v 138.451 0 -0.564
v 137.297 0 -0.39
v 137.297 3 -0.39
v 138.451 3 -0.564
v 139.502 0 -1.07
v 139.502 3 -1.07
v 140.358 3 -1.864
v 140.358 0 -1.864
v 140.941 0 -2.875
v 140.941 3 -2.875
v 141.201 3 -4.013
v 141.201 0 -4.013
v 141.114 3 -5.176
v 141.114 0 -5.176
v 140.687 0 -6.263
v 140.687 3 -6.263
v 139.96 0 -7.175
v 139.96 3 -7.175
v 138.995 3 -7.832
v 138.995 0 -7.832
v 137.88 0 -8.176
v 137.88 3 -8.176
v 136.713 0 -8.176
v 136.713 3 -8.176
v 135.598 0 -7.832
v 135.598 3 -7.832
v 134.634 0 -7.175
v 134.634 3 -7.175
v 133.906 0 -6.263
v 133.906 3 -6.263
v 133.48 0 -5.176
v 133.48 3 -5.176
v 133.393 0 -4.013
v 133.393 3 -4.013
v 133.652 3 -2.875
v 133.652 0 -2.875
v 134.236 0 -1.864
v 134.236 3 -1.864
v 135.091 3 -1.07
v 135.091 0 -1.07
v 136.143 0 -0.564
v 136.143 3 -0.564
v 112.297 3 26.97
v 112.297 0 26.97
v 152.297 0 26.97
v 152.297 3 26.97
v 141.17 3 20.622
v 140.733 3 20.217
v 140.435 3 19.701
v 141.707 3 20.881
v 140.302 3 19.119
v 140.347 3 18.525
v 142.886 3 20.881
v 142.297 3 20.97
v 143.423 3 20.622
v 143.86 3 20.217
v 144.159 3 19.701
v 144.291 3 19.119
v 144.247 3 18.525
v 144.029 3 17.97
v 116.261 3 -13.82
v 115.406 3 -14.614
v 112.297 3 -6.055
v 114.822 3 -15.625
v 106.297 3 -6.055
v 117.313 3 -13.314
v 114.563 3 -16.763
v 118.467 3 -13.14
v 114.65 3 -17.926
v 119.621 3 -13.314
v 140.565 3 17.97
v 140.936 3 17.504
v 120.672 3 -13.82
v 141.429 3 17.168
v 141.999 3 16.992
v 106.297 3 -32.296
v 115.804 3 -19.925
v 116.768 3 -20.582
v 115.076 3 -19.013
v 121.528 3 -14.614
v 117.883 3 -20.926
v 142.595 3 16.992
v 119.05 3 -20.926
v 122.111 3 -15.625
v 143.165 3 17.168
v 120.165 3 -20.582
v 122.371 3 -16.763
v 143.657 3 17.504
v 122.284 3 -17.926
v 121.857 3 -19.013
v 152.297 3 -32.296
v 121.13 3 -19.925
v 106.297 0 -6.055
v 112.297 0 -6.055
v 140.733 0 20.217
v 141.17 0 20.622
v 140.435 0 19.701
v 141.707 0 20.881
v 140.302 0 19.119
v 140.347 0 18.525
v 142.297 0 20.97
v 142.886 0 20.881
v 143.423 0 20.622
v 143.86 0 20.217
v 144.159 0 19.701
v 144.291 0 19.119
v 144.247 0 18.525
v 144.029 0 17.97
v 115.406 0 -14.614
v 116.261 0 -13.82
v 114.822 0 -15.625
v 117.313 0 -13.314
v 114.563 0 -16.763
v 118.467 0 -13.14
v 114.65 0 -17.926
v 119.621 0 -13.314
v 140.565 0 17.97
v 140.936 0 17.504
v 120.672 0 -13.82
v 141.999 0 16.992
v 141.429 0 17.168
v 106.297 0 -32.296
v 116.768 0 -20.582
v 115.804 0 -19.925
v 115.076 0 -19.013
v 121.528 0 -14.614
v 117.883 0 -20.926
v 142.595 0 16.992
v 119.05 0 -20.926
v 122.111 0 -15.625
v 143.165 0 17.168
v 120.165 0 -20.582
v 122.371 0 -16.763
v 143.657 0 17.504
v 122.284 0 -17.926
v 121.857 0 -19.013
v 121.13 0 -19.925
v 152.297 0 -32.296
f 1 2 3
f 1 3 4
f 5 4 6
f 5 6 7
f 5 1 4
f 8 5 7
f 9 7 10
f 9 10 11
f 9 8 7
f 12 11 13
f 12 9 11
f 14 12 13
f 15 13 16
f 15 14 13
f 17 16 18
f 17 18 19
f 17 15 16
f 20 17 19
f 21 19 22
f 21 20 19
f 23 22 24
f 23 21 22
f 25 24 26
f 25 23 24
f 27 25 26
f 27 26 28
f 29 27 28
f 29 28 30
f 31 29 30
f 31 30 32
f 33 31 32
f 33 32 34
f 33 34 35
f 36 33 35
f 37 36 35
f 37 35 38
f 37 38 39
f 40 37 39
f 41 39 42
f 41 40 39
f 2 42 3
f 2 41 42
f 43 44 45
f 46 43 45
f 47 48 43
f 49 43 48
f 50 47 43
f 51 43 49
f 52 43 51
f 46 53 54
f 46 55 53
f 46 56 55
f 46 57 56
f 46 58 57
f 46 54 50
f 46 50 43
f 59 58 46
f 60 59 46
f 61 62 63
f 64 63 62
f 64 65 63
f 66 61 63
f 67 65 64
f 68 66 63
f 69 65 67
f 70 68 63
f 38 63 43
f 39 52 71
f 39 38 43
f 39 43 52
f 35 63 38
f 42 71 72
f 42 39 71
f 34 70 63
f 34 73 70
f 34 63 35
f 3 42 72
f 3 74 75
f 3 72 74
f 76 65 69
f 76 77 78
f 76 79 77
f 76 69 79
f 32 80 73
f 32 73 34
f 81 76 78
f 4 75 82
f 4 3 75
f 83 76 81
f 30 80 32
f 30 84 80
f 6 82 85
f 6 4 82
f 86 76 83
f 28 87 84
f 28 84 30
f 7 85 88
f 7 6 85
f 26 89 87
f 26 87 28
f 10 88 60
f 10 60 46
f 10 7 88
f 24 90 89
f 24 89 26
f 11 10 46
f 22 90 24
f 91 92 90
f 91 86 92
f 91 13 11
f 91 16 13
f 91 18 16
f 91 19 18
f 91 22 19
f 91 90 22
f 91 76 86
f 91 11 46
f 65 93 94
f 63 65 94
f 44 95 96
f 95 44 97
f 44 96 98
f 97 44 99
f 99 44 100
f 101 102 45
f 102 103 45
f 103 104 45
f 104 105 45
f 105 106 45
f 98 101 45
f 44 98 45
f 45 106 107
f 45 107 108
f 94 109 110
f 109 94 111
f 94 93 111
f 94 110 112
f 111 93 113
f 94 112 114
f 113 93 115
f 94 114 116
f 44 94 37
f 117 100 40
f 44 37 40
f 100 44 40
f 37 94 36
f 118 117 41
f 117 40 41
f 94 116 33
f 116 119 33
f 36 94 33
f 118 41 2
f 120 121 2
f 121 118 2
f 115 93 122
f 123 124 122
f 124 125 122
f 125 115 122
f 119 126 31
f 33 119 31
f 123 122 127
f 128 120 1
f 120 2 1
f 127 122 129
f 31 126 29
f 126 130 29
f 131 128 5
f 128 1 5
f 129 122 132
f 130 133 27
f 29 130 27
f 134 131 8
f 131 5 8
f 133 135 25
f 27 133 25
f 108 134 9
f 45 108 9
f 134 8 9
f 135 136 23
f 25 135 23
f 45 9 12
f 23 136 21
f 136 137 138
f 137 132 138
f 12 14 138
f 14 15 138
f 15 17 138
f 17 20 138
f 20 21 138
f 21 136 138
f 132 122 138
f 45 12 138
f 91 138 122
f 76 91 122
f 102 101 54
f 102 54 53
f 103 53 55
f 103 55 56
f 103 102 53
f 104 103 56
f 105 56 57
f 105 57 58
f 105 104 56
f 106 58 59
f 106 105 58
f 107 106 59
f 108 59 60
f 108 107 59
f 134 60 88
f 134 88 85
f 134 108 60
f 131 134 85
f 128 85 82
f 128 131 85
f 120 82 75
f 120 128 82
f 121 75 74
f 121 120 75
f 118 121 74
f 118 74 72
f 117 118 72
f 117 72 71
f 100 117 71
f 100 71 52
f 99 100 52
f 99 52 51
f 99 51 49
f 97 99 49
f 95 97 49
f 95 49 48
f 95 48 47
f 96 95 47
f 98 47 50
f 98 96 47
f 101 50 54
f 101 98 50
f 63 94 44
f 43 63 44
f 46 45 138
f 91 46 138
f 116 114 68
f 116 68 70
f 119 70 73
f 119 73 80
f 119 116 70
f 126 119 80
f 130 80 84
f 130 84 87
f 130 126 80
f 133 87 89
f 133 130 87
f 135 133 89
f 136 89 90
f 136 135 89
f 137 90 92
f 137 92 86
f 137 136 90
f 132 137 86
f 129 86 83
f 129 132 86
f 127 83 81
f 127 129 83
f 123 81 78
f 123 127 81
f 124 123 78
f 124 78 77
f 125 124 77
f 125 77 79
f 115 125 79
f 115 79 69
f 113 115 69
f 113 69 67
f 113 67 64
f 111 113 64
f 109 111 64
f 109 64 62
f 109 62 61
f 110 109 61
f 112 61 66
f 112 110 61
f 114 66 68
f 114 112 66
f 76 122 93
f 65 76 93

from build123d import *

# Parameters (mm, degrees)
SKETCH1_6_R         = 2
SKETCH1_6_R_2       = 3.915
BOSS_EXTRUDE3_DEPTH = 3


with BuildPart() as part:
    # Sketch1<6> → Boss-Extrude3 (new body)
    with BuildSketch(Plane(origin=(0, 0, 0), x_dir=(1, 0, 0), z_dir=(0, 1, 0))):
        Polygon((152.296761578, -26.969822669), (152.296761578, 32.295700632), (106.296761578, 32.295700632), (106.296761578, 6.055177331), (112.296761578, 6.055177331), (112.296761578, -26.969822669), align=None)
        with Locations((142.296761578, -18.969822669)):
            Circle(SKETCH1_6_R, mode=Mode.SUBTRACT)
        with Locations((118.466761578, 17.055177331)):
            Circle(SKETCH1_6_R_2, mode=Mode.SUBTRACT)
        with Locations((137.296761578, 4.305177331)):
            Circle(SKETCH1_6_R_2, mode=Mode.SUBTRACT)
    extrude(amount=BOSS_EXTRUDE3_DEPTH)


solid = part.part
